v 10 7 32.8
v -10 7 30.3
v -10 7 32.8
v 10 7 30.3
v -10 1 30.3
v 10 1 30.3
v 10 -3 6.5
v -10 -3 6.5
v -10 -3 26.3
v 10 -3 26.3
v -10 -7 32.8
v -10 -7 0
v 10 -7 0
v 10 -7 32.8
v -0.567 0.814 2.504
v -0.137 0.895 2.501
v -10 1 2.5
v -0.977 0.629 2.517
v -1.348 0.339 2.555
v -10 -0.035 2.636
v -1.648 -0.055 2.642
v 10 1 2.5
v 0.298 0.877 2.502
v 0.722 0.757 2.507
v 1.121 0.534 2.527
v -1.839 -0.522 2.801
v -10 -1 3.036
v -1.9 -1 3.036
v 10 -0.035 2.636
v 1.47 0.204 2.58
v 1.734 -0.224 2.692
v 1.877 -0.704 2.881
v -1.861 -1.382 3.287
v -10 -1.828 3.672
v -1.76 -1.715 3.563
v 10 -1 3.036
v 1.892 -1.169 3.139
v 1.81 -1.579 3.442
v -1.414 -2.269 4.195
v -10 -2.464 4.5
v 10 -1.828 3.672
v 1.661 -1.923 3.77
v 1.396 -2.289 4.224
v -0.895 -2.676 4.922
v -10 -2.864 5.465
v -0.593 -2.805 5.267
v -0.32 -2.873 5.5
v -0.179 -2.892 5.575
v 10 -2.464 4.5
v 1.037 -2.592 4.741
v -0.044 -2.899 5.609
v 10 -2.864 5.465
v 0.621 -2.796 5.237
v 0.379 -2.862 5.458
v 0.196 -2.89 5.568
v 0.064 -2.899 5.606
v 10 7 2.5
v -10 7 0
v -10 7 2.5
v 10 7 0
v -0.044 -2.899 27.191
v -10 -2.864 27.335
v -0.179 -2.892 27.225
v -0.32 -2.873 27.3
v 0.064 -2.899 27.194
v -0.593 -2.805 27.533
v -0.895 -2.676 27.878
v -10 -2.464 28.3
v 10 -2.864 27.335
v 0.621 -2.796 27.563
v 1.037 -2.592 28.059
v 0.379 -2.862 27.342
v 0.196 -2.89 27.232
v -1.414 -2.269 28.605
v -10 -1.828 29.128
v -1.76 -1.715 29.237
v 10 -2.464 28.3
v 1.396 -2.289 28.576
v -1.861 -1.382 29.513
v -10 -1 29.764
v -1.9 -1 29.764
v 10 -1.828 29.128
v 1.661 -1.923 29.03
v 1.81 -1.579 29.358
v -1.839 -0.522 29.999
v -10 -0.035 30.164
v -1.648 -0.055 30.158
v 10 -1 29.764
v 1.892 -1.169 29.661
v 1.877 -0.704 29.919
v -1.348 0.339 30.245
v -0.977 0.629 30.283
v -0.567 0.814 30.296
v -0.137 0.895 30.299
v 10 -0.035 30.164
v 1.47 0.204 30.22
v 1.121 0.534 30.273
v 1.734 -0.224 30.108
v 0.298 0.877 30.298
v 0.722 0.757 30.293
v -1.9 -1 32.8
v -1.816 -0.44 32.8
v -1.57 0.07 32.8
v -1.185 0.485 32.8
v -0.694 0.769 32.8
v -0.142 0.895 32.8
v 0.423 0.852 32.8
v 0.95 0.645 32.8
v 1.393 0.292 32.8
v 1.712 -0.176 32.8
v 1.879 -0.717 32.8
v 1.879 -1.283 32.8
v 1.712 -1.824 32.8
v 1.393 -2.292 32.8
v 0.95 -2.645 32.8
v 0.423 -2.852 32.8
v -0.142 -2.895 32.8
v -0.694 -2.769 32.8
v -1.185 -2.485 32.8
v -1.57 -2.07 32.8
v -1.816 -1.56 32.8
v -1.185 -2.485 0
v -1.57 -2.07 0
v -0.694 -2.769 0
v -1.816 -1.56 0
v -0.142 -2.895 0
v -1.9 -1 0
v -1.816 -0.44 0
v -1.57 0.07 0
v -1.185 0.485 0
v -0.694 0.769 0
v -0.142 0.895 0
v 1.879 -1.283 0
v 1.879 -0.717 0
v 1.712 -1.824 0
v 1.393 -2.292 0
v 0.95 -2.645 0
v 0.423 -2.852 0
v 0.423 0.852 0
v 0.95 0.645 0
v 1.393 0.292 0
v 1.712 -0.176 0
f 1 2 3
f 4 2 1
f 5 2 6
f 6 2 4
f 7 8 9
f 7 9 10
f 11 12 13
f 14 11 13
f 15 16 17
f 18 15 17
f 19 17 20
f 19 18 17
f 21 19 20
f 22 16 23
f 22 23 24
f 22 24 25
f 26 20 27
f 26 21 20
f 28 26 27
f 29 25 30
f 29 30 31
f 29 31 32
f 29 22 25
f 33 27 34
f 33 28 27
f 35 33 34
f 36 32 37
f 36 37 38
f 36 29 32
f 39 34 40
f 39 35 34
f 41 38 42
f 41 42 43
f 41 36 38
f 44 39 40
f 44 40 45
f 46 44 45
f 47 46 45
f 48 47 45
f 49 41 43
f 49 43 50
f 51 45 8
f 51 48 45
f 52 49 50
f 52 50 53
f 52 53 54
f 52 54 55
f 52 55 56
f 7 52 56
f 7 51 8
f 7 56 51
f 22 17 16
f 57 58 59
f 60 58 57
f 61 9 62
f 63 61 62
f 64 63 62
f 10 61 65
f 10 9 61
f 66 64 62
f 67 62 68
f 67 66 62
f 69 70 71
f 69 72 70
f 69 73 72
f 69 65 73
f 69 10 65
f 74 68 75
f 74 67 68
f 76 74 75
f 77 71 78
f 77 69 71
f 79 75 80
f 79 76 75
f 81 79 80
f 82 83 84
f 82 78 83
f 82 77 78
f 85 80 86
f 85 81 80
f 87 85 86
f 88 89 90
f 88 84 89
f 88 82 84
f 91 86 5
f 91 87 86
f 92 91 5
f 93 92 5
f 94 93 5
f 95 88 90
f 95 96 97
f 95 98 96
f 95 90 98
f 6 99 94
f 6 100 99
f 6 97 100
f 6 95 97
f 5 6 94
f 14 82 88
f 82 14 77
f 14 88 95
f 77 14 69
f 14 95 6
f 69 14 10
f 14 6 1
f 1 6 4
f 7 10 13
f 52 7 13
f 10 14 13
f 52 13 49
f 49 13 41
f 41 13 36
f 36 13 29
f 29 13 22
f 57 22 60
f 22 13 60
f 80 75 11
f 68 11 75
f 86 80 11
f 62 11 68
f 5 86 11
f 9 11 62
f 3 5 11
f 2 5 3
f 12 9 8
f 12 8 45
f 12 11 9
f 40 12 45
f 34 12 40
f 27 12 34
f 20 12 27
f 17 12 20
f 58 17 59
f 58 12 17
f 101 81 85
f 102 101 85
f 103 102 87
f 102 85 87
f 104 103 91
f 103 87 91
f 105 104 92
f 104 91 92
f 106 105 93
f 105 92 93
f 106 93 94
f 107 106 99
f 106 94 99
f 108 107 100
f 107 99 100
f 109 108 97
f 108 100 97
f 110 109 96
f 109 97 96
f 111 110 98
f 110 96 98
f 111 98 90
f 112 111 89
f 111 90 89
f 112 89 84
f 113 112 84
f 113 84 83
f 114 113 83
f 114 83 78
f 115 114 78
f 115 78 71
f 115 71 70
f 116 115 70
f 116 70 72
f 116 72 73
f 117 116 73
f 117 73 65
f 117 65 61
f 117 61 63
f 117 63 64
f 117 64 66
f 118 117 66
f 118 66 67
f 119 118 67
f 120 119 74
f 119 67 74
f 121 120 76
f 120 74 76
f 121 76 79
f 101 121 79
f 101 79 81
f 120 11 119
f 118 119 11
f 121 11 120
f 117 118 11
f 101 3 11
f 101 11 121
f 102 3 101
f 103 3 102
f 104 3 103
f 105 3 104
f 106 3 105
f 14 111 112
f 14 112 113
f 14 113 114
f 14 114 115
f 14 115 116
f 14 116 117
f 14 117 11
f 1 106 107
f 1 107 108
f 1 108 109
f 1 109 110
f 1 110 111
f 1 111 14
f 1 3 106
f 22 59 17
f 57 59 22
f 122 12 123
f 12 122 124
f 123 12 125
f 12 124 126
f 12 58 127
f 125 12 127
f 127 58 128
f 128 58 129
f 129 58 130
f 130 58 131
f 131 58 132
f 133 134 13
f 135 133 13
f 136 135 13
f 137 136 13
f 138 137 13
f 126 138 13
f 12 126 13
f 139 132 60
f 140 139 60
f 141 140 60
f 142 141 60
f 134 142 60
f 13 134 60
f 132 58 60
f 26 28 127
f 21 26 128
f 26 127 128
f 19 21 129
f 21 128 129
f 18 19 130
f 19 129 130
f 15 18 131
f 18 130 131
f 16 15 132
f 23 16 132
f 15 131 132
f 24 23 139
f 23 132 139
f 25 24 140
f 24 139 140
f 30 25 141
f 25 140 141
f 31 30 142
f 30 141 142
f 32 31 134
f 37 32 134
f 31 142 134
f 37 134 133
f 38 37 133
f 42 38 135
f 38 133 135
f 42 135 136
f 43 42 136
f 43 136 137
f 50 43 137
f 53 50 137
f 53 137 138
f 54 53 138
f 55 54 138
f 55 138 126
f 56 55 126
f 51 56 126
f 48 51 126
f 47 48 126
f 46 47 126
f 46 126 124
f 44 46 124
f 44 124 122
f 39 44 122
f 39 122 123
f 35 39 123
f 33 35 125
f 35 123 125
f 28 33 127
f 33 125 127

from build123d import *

# Parameters (mm, degrees)
CROQUIS1_W              = 20
CROQUIS1_H              = 14
SALIENTE_EXTRUIR1_DEPTH = 32.8
CROQUIS2_W              = 20
CROQUIS2_H              = 27.8
CORTAR_EXTRUIR2_DEPTH   = 10
REDONDEO1_R             = 4
CROQUIS3_R              = 1.9
CORTAR_EXTRUIR3_DEPTH   = 36


with BuildPart() as part:
    # Croquis1 → Saliente-Extruir1 (new body)
    with BuildSketch(Plane.XY):
        Rectangle(CROQUIS1_W, CROQUIS1_H)
    extrude(amount=SALIENTE_EXTRUIR1_DEPTH)

    # Croquis2 → Cortar-Extruir2 (cut)
    with BuildSketch(Plane(origin=(0, 7, 0), x_dir=(1, 0, 0), z_dir=(0, 1, 0))):
        with Locations((0, -16.4)):
            Rectangle(CROQUIS2_W, CROQUIS2_H)
    extrude(amount=-CORTAR_EXTRUIR2_DEPTH, mode=Mode.SUBTRACT)

    # Redondeo1
    redondeo1_edges = [part.edges().sort_by_distance(p)[0] for p in [
        (0, -3, 2.5),
        (0, -3, 30.3),
    ]]
    fillet(redondeo1_edges, radius=REDONDEO1_R)

    # Croquis3 → Cortar-Extruir3 (cut)
    with BuildSketch(Plane(origin=(0, 0, 0), x_dir=(-1, 0, 0), z_dir=(0, 0, -1))):
        with Locations((0, -1)):
            Circle(CROQUIS3_R)
    extrude(amount=-CORTAR_EXTRUIR3_DEPTH, mode=Mode.SUBTRACT)


solid = part.part
